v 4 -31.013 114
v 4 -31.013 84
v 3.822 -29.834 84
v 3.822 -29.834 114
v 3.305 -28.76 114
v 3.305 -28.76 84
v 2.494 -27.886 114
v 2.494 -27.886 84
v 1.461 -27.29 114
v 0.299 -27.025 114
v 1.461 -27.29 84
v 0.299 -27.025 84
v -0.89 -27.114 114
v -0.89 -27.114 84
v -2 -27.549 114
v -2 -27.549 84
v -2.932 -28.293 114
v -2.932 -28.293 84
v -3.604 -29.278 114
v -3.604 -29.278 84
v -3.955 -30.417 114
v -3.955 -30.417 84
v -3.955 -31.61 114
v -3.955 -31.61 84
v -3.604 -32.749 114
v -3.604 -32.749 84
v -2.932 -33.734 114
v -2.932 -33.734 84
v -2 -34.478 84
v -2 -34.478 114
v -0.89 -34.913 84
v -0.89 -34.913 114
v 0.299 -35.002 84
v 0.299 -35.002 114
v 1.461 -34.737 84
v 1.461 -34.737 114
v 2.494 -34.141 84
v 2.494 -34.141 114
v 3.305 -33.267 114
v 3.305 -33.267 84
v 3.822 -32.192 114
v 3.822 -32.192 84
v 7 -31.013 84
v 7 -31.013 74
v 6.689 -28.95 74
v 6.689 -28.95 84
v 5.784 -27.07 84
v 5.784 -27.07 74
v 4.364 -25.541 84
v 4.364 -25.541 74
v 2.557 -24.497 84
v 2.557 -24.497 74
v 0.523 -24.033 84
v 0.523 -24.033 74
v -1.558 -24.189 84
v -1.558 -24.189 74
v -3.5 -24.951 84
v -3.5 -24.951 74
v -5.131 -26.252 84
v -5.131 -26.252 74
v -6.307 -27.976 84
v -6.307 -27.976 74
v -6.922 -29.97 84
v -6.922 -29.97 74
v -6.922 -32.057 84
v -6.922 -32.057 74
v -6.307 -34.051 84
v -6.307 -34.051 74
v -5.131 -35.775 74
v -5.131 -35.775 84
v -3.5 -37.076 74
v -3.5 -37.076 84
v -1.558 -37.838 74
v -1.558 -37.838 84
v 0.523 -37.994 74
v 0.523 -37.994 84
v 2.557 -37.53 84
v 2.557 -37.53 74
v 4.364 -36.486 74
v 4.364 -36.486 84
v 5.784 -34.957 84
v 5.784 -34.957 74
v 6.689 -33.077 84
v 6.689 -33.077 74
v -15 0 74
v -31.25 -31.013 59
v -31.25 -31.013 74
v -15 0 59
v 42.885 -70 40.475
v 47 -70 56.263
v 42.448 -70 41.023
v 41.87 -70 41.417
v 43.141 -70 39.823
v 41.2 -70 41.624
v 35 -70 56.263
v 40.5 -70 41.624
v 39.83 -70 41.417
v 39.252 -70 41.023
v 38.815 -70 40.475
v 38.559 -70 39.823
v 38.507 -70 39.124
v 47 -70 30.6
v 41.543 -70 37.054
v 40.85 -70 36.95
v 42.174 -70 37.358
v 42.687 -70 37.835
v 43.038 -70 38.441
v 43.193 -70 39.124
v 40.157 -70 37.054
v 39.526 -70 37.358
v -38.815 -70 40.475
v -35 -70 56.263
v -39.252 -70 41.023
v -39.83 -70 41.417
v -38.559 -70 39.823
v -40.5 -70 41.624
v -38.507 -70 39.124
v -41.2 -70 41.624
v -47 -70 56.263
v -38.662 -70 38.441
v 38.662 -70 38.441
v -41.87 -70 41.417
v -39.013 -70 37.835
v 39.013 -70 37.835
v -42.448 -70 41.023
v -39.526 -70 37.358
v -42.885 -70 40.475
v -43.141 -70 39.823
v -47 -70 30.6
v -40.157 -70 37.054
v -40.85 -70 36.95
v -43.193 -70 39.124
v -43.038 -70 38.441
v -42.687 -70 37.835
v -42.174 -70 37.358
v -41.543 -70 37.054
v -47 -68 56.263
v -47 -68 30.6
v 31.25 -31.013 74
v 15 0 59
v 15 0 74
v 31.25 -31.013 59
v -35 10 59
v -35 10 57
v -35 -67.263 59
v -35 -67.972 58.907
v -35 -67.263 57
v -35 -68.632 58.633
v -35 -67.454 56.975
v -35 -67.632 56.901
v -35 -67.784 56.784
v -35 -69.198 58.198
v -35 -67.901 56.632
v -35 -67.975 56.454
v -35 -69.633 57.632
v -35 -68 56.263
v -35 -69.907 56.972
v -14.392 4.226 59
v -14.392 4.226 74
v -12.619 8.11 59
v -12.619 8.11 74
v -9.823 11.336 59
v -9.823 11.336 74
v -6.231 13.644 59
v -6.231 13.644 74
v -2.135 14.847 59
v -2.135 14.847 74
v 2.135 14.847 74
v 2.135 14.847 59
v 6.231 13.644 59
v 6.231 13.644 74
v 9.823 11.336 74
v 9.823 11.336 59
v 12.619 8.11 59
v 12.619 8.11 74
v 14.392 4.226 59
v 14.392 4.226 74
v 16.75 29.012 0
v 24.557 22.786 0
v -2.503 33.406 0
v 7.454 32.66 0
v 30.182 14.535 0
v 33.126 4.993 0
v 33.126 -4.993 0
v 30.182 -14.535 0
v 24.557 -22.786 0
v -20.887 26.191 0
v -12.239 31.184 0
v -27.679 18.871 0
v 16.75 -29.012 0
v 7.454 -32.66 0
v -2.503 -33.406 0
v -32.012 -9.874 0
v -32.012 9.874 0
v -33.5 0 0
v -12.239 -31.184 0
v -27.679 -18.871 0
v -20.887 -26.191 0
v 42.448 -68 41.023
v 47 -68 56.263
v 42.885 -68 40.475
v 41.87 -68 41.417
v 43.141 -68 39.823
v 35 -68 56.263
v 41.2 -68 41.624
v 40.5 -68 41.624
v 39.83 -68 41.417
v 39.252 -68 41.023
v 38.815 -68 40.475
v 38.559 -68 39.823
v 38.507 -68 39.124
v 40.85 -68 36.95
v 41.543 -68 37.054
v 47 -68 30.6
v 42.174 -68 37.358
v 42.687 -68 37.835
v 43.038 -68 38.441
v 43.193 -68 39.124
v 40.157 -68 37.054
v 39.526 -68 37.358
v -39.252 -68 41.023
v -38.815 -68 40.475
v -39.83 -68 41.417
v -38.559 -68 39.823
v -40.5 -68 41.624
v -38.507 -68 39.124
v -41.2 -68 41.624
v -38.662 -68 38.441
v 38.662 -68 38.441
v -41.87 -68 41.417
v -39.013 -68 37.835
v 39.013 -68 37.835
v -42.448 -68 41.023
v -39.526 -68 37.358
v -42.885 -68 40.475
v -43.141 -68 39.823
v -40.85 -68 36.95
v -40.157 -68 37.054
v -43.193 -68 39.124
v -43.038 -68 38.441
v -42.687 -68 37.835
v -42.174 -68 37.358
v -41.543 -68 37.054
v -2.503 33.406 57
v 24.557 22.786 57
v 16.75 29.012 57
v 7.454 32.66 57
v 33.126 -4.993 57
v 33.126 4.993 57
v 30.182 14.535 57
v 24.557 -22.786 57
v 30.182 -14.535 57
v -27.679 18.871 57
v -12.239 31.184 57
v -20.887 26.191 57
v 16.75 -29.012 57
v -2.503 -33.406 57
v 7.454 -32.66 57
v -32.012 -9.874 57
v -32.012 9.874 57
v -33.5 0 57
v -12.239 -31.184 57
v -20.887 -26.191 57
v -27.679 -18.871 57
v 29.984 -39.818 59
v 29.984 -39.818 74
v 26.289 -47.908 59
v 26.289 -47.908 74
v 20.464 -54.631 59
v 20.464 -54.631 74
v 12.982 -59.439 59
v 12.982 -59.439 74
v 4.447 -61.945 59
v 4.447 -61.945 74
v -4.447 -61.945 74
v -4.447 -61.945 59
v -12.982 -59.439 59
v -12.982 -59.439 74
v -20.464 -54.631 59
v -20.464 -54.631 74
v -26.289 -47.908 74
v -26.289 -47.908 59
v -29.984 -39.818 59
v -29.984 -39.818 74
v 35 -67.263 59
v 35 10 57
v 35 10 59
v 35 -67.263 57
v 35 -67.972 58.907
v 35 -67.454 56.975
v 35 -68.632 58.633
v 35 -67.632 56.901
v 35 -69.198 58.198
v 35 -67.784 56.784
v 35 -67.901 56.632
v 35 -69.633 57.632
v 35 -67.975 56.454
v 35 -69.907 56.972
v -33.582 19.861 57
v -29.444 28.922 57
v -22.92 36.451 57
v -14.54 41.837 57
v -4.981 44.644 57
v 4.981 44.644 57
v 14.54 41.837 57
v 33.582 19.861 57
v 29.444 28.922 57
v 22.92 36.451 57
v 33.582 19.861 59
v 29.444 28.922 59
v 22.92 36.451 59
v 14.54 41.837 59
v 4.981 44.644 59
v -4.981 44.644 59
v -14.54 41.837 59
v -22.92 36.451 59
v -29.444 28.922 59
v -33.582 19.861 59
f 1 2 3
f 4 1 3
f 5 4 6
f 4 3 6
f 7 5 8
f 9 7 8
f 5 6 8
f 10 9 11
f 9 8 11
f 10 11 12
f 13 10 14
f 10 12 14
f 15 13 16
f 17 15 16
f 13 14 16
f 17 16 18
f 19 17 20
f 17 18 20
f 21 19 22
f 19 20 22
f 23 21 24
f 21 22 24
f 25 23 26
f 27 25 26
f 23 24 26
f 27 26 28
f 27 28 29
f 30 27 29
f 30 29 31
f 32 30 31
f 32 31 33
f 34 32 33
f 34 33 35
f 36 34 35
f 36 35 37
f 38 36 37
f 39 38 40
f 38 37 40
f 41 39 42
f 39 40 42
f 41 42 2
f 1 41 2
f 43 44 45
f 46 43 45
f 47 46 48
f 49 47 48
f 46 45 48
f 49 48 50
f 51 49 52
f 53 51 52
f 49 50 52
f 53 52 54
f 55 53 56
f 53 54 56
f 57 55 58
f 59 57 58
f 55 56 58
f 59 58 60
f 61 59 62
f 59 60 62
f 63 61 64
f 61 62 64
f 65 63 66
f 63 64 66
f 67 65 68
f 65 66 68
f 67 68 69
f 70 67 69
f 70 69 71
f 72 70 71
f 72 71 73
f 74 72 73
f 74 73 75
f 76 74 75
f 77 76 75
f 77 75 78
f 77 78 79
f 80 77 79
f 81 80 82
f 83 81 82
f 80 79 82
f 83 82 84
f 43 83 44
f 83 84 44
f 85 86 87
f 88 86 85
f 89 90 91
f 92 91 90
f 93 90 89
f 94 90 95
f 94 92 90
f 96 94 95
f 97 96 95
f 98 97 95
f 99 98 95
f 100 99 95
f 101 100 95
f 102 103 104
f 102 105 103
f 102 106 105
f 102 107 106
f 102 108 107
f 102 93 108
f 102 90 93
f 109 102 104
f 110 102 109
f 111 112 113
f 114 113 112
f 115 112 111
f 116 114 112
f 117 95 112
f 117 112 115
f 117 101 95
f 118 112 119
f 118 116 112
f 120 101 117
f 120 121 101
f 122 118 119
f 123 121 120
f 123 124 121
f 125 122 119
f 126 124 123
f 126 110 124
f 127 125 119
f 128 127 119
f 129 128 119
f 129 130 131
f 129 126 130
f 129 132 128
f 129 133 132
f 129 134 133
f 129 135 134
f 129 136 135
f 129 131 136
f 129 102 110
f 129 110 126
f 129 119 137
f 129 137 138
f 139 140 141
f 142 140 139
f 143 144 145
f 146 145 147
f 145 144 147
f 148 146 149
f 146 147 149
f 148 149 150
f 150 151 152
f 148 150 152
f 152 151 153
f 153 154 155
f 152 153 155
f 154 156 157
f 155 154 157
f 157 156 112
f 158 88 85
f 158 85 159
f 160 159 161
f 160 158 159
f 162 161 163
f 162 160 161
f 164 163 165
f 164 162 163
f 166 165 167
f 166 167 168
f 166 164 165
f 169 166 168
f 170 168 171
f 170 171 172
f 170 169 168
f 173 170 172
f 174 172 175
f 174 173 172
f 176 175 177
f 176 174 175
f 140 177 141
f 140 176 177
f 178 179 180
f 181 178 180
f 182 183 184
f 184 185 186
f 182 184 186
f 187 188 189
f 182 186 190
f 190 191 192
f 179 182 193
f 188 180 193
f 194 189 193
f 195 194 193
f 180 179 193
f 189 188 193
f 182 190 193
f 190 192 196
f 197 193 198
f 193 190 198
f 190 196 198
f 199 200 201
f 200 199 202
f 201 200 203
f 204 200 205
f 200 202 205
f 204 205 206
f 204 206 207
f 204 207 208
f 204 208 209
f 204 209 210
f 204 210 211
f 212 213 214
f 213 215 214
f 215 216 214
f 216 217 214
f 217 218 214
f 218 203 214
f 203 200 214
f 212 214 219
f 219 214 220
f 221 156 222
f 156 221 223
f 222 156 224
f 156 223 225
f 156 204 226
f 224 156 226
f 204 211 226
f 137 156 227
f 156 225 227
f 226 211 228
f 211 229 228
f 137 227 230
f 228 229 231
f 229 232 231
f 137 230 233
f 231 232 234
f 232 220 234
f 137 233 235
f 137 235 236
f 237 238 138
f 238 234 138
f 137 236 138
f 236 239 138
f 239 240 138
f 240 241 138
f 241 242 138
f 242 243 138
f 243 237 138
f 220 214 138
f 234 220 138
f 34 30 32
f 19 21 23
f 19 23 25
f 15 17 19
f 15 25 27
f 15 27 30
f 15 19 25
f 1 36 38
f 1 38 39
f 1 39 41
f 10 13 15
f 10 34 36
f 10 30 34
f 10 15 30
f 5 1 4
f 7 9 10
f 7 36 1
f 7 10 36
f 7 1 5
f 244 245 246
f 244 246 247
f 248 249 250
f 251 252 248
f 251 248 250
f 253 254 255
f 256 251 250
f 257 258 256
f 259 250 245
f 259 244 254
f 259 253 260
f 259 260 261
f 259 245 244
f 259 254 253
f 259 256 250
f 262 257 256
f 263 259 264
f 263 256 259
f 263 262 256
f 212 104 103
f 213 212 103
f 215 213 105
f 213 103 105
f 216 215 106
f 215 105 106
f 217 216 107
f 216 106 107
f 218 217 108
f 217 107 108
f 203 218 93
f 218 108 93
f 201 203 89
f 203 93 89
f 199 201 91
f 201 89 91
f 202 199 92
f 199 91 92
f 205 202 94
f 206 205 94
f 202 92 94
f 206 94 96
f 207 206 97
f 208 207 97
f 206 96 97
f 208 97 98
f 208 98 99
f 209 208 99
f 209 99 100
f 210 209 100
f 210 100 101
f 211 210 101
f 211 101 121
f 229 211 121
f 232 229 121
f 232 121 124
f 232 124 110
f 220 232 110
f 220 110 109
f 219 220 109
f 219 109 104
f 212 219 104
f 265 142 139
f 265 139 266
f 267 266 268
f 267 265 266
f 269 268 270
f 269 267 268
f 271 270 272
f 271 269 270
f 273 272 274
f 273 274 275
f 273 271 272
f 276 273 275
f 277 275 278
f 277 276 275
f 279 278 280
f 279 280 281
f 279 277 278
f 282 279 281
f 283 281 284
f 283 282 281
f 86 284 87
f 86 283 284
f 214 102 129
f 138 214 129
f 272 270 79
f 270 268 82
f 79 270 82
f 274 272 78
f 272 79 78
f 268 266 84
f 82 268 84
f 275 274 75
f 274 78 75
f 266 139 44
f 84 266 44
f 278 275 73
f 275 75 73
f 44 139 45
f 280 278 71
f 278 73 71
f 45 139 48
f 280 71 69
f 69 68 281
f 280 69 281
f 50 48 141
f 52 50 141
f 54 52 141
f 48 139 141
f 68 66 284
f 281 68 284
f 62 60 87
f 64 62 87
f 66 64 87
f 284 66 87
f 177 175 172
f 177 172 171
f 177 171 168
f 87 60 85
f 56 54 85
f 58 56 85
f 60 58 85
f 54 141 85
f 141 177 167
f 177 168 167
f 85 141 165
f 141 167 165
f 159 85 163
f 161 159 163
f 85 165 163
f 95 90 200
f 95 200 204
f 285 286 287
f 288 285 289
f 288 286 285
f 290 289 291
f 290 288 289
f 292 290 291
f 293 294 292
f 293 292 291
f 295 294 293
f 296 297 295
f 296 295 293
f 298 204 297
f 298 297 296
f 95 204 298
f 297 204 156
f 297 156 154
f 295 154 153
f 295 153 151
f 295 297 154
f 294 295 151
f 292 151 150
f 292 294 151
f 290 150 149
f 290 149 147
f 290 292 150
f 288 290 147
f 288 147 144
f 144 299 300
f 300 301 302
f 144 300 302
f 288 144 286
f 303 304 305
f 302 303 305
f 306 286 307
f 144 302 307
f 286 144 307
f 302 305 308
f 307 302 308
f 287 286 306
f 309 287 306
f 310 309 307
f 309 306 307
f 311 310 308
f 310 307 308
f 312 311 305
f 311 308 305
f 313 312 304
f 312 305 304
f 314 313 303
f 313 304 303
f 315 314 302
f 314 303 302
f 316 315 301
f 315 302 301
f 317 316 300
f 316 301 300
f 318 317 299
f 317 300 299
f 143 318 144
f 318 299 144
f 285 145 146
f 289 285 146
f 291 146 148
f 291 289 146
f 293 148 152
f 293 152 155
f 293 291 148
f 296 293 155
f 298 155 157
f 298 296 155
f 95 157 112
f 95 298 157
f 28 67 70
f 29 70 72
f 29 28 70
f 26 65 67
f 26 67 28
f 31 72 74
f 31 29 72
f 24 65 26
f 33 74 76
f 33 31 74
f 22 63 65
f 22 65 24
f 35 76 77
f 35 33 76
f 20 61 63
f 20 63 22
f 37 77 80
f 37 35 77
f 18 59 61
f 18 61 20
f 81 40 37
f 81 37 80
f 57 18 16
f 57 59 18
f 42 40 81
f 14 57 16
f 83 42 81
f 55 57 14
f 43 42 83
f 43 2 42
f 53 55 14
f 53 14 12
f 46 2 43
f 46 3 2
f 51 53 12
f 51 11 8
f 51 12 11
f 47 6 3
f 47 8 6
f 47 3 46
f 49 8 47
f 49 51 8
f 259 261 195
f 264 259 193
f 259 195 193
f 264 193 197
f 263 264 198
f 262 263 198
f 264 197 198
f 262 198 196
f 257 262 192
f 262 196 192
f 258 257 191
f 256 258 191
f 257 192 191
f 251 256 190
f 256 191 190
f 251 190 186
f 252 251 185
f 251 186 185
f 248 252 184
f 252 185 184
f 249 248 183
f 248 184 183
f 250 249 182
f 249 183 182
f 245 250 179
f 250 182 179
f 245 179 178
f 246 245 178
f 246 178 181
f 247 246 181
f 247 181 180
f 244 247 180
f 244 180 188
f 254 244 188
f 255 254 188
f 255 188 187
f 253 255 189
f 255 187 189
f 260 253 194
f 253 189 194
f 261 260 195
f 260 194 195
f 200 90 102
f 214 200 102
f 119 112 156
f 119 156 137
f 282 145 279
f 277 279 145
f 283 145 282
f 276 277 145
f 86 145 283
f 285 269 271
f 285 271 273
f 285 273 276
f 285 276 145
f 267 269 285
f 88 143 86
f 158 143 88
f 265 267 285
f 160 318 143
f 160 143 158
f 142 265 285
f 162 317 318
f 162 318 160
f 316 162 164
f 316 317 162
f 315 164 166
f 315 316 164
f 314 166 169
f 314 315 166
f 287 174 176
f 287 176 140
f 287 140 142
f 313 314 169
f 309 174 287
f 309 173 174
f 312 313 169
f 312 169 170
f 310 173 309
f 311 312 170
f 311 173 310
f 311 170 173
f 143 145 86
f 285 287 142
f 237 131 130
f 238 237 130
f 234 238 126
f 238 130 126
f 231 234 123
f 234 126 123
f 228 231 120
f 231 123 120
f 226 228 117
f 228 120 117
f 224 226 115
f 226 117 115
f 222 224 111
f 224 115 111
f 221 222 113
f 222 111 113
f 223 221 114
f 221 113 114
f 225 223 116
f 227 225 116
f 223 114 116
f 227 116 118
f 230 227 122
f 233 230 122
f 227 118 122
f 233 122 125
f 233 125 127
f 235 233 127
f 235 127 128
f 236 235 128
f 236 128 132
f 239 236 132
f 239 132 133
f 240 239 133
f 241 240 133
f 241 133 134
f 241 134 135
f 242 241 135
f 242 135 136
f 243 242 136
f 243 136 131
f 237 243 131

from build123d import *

# Parameters (mm, degrees)
SKETCH1_R                    = 33.5
BOSS_EXTRUDE1_DEPTH          = 57
BASE_FLANGE1_DEPTH           = 2
EDGE_FLANGE4_STRIP_W         = 9.4732
EDGE_FLANGE4_STRIP_H         = 2
EDGE_FLANGE4_STRIP_CUT_DEPTH = 70
EDGE_FLANGE4_DEPTH           = 70
EDGE_FLANGE4_PROFILE_W       = 94
EDGE_FLANGE4_PROFILE_H       = 25.6634
EDGE_FLANGE4_FLAT_DEPTH      = 2
BOSS_EXTRUDE5_DEPTH          = 15
SKETCH23_R                   = 7
BOSS_EXTRUDE6_DEPTH          = 10
SKETCH24_R                   = 4
BOSS_EXTRUDE7_DEPTH          = 30
SKETCH25_R                   = 2.35
CUT_EXTRUDE1_DEPTH           = 5


# Sheet-metal steps are written as plain solids
with BuildPart() as part:
    # Sketch1 → Boss-Extrude1 (new body)
    with BuildSketch(Plane.XY):
        with Locations(Location((0, 0, 0), (0, 0, 180))):
            Circle(SKETCH1_R)
    extrude(amount=BOSS_EXTRUDE1_DEPTH)


with BuildPart() as body_2:
    # Sketch2 → Base-Flange1 (new body)
    with BuildSketch(Plane.XY.offset(57)):
        with BuildLine():
            Line((-35, 10), (-35, -70))
            Line((-35, -70), (35, -70))
            Line((35, -70), (35, 10))
            ThreePointArc((35, 10), (0, 45), (-35, 10))
        make_face()
    extrude(amount=BASE_FLANGE1_DEPTH)

    # Edge-Flange4 strip (across the edge) → Edge-Flange4 strip cut (cut)
    with BuildSketch(Plane(origin=(35, -70, 57), x_dir=(0, 1, 0), z_dir=(-1, 0, 0))):
        with Locations((-2, -1)):
            Rectangle(EDGE_FLANGE4_STRIP_W, EDGE_FLANGE4_STRIP_H)
    extrude(amount=EDGE_FLANGE4_STRIP_CUT_DEPTH, mode=Mode.SUBTRACT)

    # Edge-Flange4 bend section (across the edge) → Edge-Flange4 (add)
    with BuildSketch(Plane(origin=(35, -70, 57), x_dir=(0, 1, 0), z_dir=(-1, 0, 0))):
        with BuildLine():
            Line((0, 0.7366), (2, 0.7366))
            ThreePointArc((2, 0.7366), (2.215745145, 0.215745145), (2.7366, 0))
            Line((2.7366, 0), (2.7366, -2))
            ThreePointArc((2.7366, -2), (0.801531583, -1.198468417), (0, 0.7366))
        make_face()
    extrude(amount=EDGE_FLANGE4_DEPTH)

    # Edge-Flange4 profile (on flange) → Edge-Flange4 flat (add)
    with BuildSketch(Plane(origin=(0, -70, 57), x_dir=(-1, 0, 0), z_dir=(0, -1, 0))):
        with Locations((0, 13.5683)):
            Rectangle(EDGE_FLANGE4_PROFILE_W, EDGE_FLANGE4_PROFILE_H)
    extrude(amount=-EDGE_FLANGE4_FLAT_DEPTH)

    # Sketch12 → Boss-Extrude5 (add)
    with BuildSketch(Plane.XY.offset(59)):
        with BuildLine():
            Line((-31.25, -31.0134), (-15, 0))
            ThreePointArc((-15, 0), (0, 15), (15, 0))
            Line((15, 0), (31.25, -31.0134))
            ThreePointArc((31.25, -31.0134), (0, -62.2634), (-31.25, -31.0134))
        make_face()
    extrude(amount=BOSS_EXTRUDE5_DEPTH)

    # Sketch23 → Boss-Extrude6 (add)
    with BuildSketch(Plane.XY.offset(74)):
        with Locations((0, -31.0134)):
            Circle(SKETCH23_R)
    extrude(amount=BOSS_EXTRUDE6_DEPTH)

    # Sketch24 → Boss-Extrude7 (add)
    with BuildSketch(Plane.XY.offset(84)):
        with Locations((0, -31.0134)):
            Circle(SKETCH24_R)
    extrude(amount=BOSS_EXTRUDE7_DEPTH)

    # Sketch25 → Cut-Extrude1 (cut)
    with BuildSketch(Plane.XZ.offset(70)):
        with Locations(Location((40.85, 39.3, 0), (0, 0, 270))):
            Circle(SKETCH25_R)
        with Locations(Location((-40.85, 39.3, 0), (0, 0, 270))):
            Circle(SKETCH25_R)
    extrude(amount=-CUT_EXTRUDE1_DEPTH, mode=Mode.SUBTRACT)


solid = Compound([part.part, body_2.part])
